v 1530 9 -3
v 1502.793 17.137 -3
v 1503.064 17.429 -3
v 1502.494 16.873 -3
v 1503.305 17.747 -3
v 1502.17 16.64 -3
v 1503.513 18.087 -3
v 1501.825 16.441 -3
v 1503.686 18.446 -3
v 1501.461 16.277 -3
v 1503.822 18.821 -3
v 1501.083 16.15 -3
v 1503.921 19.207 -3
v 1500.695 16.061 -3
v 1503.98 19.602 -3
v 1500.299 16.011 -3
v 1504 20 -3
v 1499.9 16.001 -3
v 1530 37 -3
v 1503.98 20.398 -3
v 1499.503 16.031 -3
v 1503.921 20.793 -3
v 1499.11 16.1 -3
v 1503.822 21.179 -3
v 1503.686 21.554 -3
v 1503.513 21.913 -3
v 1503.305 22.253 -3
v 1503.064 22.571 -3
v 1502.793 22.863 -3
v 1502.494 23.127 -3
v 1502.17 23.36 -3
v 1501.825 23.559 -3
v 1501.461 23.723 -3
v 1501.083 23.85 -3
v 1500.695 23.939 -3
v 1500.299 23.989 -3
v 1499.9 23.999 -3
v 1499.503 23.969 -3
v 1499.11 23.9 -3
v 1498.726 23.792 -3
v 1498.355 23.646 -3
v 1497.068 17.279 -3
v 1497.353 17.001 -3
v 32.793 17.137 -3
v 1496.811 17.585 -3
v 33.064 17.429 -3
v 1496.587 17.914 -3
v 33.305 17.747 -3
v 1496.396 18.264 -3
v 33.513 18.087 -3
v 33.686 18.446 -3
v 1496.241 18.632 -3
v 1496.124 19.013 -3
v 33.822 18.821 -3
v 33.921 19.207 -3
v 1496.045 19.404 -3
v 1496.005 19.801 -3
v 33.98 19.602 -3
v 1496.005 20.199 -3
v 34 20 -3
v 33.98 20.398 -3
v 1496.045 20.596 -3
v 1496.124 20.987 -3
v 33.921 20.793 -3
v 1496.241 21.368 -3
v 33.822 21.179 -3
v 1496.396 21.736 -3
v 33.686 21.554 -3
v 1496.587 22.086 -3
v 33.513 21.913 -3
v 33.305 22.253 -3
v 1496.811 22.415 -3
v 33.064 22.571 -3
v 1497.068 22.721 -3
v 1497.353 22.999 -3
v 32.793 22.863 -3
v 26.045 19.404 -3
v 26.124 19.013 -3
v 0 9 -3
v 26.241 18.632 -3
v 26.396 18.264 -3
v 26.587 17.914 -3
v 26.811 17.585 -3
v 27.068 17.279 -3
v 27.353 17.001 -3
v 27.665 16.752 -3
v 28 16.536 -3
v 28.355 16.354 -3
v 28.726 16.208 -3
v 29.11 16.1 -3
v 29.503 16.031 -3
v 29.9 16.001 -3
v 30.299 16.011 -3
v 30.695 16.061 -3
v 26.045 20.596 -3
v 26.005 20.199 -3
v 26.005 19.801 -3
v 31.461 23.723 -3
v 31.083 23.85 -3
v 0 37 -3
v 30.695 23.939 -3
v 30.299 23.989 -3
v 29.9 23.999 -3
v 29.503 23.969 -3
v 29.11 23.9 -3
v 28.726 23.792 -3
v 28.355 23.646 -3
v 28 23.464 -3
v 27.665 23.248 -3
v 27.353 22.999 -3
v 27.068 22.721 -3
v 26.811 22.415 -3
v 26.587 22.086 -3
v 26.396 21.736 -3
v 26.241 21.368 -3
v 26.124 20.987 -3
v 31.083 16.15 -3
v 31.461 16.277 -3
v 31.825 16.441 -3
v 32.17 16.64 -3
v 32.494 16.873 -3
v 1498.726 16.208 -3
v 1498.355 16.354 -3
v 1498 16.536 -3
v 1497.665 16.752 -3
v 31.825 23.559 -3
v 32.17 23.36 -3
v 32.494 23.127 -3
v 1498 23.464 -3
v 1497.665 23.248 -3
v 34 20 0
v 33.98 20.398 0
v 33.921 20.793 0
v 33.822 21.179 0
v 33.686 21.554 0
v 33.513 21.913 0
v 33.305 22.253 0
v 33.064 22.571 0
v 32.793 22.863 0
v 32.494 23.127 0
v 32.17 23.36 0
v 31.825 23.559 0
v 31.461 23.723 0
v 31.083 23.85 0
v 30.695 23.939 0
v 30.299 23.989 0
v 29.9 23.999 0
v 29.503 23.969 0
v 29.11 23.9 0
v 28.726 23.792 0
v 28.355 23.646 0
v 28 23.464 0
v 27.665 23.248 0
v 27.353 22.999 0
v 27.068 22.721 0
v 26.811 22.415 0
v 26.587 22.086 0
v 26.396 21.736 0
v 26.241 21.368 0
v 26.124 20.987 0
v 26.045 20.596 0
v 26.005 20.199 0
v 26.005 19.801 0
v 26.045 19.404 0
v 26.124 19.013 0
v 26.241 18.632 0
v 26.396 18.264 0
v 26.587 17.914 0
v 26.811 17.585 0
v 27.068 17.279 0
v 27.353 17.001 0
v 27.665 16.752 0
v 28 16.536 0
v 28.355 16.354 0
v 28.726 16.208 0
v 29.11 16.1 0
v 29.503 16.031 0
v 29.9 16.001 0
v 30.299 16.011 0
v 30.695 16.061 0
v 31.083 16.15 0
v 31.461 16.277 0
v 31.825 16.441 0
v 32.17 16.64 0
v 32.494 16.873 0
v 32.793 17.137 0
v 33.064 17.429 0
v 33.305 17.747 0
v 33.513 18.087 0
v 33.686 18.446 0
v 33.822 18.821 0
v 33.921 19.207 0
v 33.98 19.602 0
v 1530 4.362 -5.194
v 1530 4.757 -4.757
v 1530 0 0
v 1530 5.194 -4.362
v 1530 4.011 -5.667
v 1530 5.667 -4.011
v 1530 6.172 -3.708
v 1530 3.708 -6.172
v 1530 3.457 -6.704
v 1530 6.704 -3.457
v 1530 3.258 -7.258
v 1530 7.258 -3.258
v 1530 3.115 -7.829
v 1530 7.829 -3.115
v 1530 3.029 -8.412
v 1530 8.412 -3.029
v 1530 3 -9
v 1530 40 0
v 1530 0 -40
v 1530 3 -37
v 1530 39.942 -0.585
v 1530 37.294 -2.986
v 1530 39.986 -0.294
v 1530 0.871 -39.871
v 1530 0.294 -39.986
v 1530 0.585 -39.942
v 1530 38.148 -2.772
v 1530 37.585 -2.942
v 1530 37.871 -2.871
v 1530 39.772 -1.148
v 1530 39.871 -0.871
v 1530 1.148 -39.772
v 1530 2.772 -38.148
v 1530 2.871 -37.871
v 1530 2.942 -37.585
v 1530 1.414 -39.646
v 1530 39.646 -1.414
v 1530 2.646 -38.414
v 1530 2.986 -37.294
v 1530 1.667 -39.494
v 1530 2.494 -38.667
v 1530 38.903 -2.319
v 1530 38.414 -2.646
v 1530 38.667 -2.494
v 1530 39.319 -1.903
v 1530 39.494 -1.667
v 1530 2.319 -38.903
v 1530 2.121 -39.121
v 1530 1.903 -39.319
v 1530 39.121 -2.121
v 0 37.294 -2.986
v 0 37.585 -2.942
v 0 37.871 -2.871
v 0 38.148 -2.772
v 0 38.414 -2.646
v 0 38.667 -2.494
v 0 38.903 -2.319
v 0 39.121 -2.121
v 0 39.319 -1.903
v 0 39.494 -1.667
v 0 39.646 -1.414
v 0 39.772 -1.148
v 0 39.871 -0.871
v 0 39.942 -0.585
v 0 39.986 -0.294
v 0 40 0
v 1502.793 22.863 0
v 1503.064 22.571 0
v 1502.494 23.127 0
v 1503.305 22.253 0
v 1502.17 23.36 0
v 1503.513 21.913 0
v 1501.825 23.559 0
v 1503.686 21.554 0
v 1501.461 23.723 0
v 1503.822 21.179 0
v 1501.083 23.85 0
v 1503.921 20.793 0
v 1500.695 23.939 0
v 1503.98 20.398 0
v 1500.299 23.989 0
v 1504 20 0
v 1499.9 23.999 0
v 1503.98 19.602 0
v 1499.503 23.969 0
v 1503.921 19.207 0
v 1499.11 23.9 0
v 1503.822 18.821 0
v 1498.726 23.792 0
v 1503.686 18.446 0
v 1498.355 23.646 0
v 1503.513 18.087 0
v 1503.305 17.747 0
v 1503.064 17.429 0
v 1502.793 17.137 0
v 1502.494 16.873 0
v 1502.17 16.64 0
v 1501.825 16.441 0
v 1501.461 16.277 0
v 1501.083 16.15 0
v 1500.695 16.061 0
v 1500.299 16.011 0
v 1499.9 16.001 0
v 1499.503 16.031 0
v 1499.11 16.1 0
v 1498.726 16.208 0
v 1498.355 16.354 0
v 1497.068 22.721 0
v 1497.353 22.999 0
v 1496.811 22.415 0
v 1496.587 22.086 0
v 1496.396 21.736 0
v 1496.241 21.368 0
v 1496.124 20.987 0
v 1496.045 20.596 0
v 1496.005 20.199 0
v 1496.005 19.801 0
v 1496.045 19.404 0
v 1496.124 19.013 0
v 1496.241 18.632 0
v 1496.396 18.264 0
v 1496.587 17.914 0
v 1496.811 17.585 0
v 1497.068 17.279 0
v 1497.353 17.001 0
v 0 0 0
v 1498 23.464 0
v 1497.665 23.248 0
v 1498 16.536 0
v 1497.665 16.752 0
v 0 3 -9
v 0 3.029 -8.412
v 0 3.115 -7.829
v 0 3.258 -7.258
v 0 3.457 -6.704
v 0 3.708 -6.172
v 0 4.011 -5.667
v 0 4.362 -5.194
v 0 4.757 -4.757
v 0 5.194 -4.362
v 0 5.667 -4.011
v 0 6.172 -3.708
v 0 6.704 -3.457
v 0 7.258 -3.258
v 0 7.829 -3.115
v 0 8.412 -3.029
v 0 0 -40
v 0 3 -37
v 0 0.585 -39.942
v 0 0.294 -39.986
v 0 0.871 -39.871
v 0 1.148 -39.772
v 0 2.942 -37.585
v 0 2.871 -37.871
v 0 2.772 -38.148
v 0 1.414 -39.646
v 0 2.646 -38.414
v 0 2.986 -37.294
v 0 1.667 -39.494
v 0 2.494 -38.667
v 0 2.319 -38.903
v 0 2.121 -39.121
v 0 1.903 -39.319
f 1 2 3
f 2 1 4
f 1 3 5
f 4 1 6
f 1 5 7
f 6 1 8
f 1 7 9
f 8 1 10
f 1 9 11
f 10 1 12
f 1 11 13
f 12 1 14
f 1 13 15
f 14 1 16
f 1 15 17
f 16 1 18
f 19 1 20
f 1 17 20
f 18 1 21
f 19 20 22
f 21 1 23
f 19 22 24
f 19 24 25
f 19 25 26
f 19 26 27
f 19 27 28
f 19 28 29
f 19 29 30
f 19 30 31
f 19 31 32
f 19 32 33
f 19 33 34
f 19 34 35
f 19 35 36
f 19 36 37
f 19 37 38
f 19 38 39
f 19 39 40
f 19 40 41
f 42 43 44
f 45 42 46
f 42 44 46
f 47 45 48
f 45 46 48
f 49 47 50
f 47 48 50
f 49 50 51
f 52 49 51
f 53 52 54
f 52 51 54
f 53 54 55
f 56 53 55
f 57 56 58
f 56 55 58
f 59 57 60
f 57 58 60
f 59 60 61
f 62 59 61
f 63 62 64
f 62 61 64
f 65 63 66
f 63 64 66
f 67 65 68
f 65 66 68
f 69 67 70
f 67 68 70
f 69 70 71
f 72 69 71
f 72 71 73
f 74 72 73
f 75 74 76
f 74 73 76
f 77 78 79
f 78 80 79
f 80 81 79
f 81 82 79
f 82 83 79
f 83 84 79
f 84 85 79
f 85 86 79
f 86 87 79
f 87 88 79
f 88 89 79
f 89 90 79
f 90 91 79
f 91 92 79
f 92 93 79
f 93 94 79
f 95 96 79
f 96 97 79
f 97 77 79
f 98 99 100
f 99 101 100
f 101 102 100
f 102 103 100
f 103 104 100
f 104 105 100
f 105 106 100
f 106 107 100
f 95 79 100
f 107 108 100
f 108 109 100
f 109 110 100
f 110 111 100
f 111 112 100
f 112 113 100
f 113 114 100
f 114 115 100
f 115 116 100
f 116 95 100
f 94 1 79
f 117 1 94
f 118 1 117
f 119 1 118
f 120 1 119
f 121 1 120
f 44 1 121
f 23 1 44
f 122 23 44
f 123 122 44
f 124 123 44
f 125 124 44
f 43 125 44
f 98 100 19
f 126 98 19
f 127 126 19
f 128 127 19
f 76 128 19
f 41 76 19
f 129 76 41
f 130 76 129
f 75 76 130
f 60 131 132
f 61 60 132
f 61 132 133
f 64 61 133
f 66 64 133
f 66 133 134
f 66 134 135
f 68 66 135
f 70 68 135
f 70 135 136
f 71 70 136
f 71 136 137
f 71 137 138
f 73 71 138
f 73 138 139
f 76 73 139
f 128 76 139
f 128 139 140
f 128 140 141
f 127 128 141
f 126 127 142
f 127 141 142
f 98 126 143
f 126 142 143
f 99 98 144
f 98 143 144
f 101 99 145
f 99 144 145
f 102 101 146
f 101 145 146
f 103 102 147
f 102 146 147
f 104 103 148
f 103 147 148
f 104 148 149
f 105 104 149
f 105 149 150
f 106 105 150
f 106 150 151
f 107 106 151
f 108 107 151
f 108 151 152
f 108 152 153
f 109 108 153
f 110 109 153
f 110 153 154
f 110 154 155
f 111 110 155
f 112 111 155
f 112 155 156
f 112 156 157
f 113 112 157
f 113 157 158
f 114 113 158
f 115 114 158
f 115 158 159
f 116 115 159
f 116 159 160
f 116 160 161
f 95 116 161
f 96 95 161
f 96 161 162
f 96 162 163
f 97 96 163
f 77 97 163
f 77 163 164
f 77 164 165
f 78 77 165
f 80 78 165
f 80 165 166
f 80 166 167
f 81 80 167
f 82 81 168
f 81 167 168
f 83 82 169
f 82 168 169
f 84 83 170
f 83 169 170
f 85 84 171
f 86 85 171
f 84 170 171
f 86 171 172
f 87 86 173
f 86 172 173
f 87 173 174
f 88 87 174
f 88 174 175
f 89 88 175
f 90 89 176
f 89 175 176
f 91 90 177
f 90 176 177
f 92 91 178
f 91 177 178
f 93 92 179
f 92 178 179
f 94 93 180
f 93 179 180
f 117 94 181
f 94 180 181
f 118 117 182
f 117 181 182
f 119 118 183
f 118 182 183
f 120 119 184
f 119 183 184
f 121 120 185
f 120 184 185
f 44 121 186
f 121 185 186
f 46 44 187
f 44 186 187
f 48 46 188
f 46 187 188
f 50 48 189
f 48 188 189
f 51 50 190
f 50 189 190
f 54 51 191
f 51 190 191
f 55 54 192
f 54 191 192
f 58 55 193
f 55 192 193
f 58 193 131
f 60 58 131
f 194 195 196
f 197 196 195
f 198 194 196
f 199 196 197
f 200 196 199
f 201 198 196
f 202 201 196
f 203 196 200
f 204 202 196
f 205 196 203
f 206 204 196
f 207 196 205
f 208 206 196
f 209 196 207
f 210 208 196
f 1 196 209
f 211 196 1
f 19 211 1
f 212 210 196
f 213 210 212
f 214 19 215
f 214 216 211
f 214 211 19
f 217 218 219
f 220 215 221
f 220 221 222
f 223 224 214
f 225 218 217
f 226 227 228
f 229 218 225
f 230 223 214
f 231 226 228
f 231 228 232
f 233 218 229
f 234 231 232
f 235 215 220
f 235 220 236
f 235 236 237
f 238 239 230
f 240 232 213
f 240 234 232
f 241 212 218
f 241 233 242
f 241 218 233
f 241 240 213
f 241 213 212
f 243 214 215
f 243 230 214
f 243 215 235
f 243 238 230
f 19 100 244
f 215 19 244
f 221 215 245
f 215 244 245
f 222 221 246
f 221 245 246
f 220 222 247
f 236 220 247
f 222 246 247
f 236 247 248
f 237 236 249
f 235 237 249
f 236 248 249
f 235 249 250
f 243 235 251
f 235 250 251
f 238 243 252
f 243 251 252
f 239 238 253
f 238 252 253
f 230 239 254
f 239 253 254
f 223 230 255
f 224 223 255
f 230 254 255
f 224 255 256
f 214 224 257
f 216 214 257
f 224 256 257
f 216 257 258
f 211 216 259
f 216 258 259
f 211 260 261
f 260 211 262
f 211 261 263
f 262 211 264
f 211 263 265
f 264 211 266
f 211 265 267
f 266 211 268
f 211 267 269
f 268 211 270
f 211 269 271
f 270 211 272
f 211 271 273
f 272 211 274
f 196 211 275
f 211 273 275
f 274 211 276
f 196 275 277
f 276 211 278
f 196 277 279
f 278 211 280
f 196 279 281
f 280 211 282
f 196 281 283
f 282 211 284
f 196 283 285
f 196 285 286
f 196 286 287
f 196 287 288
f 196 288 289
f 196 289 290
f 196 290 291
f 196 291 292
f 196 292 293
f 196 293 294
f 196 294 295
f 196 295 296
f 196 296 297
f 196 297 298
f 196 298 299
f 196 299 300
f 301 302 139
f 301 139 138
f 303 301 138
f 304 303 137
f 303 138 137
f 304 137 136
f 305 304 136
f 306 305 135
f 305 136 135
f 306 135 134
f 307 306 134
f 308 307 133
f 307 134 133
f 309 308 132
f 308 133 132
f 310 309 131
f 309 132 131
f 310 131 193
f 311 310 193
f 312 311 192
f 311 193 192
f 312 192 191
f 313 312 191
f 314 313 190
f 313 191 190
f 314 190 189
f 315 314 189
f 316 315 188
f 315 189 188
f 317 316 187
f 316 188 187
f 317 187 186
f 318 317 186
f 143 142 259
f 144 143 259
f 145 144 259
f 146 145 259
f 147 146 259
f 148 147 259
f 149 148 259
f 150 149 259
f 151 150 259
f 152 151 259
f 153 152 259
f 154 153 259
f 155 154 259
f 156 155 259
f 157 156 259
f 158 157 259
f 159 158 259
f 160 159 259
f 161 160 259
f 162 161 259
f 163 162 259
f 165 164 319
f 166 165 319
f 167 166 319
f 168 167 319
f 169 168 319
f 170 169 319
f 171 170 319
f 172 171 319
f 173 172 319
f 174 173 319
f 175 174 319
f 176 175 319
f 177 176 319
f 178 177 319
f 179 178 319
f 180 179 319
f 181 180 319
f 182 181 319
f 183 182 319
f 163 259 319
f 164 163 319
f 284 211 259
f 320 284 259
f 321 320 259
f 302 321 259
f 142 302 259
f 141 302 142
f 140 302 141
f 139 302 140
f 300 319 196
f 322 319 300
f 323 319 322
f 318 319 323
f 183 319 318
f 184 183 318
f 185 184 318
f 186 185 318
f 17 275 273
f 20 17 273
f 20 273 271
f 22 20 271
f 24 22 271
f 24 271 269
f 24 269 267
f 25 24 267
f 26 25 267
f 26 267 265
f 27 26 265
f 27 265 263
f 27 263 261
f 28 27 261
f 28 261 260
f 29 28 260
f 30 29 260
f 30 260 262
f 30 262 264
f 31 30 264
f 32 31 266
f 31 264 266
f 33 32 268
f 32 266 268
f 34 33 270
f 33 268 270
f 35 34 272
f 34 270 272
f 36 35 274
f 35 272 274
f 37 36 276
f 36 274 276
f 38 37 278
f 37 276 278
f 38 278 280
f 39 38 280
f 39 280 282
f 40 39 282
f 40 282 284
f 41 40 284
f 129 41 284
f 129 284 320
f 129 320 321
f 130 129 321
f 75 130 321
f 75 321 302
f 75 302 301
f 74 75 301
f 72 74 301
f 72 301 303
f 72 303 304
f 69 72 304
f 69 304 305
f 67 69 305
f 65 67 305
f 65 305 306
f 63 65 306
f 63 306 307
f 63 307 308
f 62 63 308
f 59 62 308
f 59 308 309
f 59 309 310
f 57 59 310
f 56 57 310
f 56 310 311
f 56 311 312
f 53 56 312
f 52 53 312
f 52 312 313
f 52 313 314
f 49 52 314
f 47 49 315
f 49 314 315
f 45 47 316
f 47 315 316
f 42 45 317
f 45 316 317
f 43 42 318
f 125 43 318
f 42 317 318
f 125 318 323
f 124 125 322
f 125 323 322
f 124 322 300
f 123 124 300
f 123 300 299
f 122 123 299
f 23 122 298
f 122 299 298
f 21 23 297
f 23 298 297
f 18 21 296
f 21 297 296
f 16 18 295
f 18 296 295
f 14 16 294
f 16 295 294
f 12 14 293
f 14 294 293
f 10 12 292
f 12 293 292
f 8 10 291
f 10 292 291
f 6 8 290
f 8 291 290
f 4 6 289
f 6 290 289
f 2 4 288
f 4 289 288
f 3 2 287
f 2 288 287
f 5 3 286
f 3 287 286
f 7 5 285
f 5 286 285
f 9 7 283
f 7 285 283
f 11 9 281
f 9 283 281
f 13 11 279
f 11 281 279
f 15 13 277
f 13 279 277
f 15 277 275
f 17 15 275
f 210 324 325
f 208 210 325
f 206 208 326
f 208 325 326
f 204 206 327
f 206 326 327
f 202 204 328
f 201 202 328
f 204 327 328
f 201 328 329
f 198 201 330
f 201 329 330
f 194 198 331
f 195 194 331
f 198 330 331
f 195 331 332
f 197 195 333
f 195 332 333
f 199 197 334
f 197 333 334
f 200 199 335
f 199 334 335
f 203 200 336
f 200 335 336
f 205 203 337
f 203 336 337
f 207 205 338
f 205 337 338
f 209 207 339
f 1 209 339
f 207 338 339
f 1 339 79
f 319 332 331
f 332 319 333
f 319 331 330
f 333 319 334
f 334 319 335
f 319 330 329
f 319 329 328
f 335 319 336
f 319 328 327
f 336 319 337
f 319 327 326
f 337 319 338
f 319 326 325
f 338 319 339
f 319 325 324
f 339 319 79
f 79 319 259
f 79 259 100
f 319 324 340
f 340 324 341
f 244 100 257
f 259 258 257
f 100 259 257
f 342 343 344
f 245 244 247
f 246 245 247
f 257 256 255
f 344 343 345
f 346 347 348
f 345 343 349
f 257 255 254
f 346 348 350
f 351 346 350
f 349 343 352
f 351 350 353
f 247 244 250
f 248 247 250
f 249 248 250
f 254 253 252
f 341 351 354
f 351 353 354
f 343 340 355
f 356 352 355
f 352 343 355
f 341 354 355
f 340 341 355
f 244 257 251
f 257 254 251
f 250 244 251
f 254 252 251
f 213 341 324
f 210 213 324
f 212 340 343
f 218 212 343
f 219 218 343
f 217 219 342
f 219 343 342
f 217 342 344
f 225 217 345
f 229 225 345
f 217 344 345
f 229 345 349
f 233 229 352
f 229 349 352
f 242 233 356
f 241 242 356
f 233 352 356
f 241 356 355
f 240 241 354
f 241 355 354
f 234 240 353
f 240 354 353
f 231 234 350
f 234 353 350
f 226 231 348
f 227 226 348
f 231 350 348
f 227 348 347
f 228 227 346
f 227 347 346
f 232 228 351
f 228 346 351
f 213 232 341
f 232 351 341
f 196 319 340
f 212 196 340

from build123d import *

# Parameters (mm, degrees)
L_ANGLE_EQUAL_40X40X3_5_DEPTH = 1530
SKETCH16_R                    = 4
CUT_EXTRUDE1_DEPTH            = 1532.045394494


with BuildPart() as part:
    # Sketch13 → L angle (equal) 40X40X3(5) (new body)
    with BuildSketch(Plane(origin=(0, 0, 0), x_dir=(0, 0, -1), z_dir=(1, 0, 0))):
        with BuildLine():
            Line((0, 40), (0, 0))
            Line((0, 0), (40, 0))
            ThreePointArc((40, 0), (39.121320344, 2.121320344), (37, 3))
            Line((37, 3), (9, 3))
            ThreePointArc((9, 3), (4.757359313, 4.757359313), (3, 9))
            Line((3, 9), (3, 37))
            ThreePointArc((3, 37), (2.121320344, 39.121320344), (0, 40))
        make_face()
    extrude(amount=L_ANGLE_EQUAL_40X40X3_5_DEPTH)

    # Sketch16 → Cut-Extrude1 (cut, through all)
    with BuildSketch(Plane.XY):
        with Locations((1500, 20)):
            Circle(SKETCH16_R)
        with Locations((30, 20)):
            Circle(SKETCH16_R)
    extrude(amount=-CUT_EXTRUDE1_DEPTH, mode=Mode.SUBTRACT)


solid = part.part
